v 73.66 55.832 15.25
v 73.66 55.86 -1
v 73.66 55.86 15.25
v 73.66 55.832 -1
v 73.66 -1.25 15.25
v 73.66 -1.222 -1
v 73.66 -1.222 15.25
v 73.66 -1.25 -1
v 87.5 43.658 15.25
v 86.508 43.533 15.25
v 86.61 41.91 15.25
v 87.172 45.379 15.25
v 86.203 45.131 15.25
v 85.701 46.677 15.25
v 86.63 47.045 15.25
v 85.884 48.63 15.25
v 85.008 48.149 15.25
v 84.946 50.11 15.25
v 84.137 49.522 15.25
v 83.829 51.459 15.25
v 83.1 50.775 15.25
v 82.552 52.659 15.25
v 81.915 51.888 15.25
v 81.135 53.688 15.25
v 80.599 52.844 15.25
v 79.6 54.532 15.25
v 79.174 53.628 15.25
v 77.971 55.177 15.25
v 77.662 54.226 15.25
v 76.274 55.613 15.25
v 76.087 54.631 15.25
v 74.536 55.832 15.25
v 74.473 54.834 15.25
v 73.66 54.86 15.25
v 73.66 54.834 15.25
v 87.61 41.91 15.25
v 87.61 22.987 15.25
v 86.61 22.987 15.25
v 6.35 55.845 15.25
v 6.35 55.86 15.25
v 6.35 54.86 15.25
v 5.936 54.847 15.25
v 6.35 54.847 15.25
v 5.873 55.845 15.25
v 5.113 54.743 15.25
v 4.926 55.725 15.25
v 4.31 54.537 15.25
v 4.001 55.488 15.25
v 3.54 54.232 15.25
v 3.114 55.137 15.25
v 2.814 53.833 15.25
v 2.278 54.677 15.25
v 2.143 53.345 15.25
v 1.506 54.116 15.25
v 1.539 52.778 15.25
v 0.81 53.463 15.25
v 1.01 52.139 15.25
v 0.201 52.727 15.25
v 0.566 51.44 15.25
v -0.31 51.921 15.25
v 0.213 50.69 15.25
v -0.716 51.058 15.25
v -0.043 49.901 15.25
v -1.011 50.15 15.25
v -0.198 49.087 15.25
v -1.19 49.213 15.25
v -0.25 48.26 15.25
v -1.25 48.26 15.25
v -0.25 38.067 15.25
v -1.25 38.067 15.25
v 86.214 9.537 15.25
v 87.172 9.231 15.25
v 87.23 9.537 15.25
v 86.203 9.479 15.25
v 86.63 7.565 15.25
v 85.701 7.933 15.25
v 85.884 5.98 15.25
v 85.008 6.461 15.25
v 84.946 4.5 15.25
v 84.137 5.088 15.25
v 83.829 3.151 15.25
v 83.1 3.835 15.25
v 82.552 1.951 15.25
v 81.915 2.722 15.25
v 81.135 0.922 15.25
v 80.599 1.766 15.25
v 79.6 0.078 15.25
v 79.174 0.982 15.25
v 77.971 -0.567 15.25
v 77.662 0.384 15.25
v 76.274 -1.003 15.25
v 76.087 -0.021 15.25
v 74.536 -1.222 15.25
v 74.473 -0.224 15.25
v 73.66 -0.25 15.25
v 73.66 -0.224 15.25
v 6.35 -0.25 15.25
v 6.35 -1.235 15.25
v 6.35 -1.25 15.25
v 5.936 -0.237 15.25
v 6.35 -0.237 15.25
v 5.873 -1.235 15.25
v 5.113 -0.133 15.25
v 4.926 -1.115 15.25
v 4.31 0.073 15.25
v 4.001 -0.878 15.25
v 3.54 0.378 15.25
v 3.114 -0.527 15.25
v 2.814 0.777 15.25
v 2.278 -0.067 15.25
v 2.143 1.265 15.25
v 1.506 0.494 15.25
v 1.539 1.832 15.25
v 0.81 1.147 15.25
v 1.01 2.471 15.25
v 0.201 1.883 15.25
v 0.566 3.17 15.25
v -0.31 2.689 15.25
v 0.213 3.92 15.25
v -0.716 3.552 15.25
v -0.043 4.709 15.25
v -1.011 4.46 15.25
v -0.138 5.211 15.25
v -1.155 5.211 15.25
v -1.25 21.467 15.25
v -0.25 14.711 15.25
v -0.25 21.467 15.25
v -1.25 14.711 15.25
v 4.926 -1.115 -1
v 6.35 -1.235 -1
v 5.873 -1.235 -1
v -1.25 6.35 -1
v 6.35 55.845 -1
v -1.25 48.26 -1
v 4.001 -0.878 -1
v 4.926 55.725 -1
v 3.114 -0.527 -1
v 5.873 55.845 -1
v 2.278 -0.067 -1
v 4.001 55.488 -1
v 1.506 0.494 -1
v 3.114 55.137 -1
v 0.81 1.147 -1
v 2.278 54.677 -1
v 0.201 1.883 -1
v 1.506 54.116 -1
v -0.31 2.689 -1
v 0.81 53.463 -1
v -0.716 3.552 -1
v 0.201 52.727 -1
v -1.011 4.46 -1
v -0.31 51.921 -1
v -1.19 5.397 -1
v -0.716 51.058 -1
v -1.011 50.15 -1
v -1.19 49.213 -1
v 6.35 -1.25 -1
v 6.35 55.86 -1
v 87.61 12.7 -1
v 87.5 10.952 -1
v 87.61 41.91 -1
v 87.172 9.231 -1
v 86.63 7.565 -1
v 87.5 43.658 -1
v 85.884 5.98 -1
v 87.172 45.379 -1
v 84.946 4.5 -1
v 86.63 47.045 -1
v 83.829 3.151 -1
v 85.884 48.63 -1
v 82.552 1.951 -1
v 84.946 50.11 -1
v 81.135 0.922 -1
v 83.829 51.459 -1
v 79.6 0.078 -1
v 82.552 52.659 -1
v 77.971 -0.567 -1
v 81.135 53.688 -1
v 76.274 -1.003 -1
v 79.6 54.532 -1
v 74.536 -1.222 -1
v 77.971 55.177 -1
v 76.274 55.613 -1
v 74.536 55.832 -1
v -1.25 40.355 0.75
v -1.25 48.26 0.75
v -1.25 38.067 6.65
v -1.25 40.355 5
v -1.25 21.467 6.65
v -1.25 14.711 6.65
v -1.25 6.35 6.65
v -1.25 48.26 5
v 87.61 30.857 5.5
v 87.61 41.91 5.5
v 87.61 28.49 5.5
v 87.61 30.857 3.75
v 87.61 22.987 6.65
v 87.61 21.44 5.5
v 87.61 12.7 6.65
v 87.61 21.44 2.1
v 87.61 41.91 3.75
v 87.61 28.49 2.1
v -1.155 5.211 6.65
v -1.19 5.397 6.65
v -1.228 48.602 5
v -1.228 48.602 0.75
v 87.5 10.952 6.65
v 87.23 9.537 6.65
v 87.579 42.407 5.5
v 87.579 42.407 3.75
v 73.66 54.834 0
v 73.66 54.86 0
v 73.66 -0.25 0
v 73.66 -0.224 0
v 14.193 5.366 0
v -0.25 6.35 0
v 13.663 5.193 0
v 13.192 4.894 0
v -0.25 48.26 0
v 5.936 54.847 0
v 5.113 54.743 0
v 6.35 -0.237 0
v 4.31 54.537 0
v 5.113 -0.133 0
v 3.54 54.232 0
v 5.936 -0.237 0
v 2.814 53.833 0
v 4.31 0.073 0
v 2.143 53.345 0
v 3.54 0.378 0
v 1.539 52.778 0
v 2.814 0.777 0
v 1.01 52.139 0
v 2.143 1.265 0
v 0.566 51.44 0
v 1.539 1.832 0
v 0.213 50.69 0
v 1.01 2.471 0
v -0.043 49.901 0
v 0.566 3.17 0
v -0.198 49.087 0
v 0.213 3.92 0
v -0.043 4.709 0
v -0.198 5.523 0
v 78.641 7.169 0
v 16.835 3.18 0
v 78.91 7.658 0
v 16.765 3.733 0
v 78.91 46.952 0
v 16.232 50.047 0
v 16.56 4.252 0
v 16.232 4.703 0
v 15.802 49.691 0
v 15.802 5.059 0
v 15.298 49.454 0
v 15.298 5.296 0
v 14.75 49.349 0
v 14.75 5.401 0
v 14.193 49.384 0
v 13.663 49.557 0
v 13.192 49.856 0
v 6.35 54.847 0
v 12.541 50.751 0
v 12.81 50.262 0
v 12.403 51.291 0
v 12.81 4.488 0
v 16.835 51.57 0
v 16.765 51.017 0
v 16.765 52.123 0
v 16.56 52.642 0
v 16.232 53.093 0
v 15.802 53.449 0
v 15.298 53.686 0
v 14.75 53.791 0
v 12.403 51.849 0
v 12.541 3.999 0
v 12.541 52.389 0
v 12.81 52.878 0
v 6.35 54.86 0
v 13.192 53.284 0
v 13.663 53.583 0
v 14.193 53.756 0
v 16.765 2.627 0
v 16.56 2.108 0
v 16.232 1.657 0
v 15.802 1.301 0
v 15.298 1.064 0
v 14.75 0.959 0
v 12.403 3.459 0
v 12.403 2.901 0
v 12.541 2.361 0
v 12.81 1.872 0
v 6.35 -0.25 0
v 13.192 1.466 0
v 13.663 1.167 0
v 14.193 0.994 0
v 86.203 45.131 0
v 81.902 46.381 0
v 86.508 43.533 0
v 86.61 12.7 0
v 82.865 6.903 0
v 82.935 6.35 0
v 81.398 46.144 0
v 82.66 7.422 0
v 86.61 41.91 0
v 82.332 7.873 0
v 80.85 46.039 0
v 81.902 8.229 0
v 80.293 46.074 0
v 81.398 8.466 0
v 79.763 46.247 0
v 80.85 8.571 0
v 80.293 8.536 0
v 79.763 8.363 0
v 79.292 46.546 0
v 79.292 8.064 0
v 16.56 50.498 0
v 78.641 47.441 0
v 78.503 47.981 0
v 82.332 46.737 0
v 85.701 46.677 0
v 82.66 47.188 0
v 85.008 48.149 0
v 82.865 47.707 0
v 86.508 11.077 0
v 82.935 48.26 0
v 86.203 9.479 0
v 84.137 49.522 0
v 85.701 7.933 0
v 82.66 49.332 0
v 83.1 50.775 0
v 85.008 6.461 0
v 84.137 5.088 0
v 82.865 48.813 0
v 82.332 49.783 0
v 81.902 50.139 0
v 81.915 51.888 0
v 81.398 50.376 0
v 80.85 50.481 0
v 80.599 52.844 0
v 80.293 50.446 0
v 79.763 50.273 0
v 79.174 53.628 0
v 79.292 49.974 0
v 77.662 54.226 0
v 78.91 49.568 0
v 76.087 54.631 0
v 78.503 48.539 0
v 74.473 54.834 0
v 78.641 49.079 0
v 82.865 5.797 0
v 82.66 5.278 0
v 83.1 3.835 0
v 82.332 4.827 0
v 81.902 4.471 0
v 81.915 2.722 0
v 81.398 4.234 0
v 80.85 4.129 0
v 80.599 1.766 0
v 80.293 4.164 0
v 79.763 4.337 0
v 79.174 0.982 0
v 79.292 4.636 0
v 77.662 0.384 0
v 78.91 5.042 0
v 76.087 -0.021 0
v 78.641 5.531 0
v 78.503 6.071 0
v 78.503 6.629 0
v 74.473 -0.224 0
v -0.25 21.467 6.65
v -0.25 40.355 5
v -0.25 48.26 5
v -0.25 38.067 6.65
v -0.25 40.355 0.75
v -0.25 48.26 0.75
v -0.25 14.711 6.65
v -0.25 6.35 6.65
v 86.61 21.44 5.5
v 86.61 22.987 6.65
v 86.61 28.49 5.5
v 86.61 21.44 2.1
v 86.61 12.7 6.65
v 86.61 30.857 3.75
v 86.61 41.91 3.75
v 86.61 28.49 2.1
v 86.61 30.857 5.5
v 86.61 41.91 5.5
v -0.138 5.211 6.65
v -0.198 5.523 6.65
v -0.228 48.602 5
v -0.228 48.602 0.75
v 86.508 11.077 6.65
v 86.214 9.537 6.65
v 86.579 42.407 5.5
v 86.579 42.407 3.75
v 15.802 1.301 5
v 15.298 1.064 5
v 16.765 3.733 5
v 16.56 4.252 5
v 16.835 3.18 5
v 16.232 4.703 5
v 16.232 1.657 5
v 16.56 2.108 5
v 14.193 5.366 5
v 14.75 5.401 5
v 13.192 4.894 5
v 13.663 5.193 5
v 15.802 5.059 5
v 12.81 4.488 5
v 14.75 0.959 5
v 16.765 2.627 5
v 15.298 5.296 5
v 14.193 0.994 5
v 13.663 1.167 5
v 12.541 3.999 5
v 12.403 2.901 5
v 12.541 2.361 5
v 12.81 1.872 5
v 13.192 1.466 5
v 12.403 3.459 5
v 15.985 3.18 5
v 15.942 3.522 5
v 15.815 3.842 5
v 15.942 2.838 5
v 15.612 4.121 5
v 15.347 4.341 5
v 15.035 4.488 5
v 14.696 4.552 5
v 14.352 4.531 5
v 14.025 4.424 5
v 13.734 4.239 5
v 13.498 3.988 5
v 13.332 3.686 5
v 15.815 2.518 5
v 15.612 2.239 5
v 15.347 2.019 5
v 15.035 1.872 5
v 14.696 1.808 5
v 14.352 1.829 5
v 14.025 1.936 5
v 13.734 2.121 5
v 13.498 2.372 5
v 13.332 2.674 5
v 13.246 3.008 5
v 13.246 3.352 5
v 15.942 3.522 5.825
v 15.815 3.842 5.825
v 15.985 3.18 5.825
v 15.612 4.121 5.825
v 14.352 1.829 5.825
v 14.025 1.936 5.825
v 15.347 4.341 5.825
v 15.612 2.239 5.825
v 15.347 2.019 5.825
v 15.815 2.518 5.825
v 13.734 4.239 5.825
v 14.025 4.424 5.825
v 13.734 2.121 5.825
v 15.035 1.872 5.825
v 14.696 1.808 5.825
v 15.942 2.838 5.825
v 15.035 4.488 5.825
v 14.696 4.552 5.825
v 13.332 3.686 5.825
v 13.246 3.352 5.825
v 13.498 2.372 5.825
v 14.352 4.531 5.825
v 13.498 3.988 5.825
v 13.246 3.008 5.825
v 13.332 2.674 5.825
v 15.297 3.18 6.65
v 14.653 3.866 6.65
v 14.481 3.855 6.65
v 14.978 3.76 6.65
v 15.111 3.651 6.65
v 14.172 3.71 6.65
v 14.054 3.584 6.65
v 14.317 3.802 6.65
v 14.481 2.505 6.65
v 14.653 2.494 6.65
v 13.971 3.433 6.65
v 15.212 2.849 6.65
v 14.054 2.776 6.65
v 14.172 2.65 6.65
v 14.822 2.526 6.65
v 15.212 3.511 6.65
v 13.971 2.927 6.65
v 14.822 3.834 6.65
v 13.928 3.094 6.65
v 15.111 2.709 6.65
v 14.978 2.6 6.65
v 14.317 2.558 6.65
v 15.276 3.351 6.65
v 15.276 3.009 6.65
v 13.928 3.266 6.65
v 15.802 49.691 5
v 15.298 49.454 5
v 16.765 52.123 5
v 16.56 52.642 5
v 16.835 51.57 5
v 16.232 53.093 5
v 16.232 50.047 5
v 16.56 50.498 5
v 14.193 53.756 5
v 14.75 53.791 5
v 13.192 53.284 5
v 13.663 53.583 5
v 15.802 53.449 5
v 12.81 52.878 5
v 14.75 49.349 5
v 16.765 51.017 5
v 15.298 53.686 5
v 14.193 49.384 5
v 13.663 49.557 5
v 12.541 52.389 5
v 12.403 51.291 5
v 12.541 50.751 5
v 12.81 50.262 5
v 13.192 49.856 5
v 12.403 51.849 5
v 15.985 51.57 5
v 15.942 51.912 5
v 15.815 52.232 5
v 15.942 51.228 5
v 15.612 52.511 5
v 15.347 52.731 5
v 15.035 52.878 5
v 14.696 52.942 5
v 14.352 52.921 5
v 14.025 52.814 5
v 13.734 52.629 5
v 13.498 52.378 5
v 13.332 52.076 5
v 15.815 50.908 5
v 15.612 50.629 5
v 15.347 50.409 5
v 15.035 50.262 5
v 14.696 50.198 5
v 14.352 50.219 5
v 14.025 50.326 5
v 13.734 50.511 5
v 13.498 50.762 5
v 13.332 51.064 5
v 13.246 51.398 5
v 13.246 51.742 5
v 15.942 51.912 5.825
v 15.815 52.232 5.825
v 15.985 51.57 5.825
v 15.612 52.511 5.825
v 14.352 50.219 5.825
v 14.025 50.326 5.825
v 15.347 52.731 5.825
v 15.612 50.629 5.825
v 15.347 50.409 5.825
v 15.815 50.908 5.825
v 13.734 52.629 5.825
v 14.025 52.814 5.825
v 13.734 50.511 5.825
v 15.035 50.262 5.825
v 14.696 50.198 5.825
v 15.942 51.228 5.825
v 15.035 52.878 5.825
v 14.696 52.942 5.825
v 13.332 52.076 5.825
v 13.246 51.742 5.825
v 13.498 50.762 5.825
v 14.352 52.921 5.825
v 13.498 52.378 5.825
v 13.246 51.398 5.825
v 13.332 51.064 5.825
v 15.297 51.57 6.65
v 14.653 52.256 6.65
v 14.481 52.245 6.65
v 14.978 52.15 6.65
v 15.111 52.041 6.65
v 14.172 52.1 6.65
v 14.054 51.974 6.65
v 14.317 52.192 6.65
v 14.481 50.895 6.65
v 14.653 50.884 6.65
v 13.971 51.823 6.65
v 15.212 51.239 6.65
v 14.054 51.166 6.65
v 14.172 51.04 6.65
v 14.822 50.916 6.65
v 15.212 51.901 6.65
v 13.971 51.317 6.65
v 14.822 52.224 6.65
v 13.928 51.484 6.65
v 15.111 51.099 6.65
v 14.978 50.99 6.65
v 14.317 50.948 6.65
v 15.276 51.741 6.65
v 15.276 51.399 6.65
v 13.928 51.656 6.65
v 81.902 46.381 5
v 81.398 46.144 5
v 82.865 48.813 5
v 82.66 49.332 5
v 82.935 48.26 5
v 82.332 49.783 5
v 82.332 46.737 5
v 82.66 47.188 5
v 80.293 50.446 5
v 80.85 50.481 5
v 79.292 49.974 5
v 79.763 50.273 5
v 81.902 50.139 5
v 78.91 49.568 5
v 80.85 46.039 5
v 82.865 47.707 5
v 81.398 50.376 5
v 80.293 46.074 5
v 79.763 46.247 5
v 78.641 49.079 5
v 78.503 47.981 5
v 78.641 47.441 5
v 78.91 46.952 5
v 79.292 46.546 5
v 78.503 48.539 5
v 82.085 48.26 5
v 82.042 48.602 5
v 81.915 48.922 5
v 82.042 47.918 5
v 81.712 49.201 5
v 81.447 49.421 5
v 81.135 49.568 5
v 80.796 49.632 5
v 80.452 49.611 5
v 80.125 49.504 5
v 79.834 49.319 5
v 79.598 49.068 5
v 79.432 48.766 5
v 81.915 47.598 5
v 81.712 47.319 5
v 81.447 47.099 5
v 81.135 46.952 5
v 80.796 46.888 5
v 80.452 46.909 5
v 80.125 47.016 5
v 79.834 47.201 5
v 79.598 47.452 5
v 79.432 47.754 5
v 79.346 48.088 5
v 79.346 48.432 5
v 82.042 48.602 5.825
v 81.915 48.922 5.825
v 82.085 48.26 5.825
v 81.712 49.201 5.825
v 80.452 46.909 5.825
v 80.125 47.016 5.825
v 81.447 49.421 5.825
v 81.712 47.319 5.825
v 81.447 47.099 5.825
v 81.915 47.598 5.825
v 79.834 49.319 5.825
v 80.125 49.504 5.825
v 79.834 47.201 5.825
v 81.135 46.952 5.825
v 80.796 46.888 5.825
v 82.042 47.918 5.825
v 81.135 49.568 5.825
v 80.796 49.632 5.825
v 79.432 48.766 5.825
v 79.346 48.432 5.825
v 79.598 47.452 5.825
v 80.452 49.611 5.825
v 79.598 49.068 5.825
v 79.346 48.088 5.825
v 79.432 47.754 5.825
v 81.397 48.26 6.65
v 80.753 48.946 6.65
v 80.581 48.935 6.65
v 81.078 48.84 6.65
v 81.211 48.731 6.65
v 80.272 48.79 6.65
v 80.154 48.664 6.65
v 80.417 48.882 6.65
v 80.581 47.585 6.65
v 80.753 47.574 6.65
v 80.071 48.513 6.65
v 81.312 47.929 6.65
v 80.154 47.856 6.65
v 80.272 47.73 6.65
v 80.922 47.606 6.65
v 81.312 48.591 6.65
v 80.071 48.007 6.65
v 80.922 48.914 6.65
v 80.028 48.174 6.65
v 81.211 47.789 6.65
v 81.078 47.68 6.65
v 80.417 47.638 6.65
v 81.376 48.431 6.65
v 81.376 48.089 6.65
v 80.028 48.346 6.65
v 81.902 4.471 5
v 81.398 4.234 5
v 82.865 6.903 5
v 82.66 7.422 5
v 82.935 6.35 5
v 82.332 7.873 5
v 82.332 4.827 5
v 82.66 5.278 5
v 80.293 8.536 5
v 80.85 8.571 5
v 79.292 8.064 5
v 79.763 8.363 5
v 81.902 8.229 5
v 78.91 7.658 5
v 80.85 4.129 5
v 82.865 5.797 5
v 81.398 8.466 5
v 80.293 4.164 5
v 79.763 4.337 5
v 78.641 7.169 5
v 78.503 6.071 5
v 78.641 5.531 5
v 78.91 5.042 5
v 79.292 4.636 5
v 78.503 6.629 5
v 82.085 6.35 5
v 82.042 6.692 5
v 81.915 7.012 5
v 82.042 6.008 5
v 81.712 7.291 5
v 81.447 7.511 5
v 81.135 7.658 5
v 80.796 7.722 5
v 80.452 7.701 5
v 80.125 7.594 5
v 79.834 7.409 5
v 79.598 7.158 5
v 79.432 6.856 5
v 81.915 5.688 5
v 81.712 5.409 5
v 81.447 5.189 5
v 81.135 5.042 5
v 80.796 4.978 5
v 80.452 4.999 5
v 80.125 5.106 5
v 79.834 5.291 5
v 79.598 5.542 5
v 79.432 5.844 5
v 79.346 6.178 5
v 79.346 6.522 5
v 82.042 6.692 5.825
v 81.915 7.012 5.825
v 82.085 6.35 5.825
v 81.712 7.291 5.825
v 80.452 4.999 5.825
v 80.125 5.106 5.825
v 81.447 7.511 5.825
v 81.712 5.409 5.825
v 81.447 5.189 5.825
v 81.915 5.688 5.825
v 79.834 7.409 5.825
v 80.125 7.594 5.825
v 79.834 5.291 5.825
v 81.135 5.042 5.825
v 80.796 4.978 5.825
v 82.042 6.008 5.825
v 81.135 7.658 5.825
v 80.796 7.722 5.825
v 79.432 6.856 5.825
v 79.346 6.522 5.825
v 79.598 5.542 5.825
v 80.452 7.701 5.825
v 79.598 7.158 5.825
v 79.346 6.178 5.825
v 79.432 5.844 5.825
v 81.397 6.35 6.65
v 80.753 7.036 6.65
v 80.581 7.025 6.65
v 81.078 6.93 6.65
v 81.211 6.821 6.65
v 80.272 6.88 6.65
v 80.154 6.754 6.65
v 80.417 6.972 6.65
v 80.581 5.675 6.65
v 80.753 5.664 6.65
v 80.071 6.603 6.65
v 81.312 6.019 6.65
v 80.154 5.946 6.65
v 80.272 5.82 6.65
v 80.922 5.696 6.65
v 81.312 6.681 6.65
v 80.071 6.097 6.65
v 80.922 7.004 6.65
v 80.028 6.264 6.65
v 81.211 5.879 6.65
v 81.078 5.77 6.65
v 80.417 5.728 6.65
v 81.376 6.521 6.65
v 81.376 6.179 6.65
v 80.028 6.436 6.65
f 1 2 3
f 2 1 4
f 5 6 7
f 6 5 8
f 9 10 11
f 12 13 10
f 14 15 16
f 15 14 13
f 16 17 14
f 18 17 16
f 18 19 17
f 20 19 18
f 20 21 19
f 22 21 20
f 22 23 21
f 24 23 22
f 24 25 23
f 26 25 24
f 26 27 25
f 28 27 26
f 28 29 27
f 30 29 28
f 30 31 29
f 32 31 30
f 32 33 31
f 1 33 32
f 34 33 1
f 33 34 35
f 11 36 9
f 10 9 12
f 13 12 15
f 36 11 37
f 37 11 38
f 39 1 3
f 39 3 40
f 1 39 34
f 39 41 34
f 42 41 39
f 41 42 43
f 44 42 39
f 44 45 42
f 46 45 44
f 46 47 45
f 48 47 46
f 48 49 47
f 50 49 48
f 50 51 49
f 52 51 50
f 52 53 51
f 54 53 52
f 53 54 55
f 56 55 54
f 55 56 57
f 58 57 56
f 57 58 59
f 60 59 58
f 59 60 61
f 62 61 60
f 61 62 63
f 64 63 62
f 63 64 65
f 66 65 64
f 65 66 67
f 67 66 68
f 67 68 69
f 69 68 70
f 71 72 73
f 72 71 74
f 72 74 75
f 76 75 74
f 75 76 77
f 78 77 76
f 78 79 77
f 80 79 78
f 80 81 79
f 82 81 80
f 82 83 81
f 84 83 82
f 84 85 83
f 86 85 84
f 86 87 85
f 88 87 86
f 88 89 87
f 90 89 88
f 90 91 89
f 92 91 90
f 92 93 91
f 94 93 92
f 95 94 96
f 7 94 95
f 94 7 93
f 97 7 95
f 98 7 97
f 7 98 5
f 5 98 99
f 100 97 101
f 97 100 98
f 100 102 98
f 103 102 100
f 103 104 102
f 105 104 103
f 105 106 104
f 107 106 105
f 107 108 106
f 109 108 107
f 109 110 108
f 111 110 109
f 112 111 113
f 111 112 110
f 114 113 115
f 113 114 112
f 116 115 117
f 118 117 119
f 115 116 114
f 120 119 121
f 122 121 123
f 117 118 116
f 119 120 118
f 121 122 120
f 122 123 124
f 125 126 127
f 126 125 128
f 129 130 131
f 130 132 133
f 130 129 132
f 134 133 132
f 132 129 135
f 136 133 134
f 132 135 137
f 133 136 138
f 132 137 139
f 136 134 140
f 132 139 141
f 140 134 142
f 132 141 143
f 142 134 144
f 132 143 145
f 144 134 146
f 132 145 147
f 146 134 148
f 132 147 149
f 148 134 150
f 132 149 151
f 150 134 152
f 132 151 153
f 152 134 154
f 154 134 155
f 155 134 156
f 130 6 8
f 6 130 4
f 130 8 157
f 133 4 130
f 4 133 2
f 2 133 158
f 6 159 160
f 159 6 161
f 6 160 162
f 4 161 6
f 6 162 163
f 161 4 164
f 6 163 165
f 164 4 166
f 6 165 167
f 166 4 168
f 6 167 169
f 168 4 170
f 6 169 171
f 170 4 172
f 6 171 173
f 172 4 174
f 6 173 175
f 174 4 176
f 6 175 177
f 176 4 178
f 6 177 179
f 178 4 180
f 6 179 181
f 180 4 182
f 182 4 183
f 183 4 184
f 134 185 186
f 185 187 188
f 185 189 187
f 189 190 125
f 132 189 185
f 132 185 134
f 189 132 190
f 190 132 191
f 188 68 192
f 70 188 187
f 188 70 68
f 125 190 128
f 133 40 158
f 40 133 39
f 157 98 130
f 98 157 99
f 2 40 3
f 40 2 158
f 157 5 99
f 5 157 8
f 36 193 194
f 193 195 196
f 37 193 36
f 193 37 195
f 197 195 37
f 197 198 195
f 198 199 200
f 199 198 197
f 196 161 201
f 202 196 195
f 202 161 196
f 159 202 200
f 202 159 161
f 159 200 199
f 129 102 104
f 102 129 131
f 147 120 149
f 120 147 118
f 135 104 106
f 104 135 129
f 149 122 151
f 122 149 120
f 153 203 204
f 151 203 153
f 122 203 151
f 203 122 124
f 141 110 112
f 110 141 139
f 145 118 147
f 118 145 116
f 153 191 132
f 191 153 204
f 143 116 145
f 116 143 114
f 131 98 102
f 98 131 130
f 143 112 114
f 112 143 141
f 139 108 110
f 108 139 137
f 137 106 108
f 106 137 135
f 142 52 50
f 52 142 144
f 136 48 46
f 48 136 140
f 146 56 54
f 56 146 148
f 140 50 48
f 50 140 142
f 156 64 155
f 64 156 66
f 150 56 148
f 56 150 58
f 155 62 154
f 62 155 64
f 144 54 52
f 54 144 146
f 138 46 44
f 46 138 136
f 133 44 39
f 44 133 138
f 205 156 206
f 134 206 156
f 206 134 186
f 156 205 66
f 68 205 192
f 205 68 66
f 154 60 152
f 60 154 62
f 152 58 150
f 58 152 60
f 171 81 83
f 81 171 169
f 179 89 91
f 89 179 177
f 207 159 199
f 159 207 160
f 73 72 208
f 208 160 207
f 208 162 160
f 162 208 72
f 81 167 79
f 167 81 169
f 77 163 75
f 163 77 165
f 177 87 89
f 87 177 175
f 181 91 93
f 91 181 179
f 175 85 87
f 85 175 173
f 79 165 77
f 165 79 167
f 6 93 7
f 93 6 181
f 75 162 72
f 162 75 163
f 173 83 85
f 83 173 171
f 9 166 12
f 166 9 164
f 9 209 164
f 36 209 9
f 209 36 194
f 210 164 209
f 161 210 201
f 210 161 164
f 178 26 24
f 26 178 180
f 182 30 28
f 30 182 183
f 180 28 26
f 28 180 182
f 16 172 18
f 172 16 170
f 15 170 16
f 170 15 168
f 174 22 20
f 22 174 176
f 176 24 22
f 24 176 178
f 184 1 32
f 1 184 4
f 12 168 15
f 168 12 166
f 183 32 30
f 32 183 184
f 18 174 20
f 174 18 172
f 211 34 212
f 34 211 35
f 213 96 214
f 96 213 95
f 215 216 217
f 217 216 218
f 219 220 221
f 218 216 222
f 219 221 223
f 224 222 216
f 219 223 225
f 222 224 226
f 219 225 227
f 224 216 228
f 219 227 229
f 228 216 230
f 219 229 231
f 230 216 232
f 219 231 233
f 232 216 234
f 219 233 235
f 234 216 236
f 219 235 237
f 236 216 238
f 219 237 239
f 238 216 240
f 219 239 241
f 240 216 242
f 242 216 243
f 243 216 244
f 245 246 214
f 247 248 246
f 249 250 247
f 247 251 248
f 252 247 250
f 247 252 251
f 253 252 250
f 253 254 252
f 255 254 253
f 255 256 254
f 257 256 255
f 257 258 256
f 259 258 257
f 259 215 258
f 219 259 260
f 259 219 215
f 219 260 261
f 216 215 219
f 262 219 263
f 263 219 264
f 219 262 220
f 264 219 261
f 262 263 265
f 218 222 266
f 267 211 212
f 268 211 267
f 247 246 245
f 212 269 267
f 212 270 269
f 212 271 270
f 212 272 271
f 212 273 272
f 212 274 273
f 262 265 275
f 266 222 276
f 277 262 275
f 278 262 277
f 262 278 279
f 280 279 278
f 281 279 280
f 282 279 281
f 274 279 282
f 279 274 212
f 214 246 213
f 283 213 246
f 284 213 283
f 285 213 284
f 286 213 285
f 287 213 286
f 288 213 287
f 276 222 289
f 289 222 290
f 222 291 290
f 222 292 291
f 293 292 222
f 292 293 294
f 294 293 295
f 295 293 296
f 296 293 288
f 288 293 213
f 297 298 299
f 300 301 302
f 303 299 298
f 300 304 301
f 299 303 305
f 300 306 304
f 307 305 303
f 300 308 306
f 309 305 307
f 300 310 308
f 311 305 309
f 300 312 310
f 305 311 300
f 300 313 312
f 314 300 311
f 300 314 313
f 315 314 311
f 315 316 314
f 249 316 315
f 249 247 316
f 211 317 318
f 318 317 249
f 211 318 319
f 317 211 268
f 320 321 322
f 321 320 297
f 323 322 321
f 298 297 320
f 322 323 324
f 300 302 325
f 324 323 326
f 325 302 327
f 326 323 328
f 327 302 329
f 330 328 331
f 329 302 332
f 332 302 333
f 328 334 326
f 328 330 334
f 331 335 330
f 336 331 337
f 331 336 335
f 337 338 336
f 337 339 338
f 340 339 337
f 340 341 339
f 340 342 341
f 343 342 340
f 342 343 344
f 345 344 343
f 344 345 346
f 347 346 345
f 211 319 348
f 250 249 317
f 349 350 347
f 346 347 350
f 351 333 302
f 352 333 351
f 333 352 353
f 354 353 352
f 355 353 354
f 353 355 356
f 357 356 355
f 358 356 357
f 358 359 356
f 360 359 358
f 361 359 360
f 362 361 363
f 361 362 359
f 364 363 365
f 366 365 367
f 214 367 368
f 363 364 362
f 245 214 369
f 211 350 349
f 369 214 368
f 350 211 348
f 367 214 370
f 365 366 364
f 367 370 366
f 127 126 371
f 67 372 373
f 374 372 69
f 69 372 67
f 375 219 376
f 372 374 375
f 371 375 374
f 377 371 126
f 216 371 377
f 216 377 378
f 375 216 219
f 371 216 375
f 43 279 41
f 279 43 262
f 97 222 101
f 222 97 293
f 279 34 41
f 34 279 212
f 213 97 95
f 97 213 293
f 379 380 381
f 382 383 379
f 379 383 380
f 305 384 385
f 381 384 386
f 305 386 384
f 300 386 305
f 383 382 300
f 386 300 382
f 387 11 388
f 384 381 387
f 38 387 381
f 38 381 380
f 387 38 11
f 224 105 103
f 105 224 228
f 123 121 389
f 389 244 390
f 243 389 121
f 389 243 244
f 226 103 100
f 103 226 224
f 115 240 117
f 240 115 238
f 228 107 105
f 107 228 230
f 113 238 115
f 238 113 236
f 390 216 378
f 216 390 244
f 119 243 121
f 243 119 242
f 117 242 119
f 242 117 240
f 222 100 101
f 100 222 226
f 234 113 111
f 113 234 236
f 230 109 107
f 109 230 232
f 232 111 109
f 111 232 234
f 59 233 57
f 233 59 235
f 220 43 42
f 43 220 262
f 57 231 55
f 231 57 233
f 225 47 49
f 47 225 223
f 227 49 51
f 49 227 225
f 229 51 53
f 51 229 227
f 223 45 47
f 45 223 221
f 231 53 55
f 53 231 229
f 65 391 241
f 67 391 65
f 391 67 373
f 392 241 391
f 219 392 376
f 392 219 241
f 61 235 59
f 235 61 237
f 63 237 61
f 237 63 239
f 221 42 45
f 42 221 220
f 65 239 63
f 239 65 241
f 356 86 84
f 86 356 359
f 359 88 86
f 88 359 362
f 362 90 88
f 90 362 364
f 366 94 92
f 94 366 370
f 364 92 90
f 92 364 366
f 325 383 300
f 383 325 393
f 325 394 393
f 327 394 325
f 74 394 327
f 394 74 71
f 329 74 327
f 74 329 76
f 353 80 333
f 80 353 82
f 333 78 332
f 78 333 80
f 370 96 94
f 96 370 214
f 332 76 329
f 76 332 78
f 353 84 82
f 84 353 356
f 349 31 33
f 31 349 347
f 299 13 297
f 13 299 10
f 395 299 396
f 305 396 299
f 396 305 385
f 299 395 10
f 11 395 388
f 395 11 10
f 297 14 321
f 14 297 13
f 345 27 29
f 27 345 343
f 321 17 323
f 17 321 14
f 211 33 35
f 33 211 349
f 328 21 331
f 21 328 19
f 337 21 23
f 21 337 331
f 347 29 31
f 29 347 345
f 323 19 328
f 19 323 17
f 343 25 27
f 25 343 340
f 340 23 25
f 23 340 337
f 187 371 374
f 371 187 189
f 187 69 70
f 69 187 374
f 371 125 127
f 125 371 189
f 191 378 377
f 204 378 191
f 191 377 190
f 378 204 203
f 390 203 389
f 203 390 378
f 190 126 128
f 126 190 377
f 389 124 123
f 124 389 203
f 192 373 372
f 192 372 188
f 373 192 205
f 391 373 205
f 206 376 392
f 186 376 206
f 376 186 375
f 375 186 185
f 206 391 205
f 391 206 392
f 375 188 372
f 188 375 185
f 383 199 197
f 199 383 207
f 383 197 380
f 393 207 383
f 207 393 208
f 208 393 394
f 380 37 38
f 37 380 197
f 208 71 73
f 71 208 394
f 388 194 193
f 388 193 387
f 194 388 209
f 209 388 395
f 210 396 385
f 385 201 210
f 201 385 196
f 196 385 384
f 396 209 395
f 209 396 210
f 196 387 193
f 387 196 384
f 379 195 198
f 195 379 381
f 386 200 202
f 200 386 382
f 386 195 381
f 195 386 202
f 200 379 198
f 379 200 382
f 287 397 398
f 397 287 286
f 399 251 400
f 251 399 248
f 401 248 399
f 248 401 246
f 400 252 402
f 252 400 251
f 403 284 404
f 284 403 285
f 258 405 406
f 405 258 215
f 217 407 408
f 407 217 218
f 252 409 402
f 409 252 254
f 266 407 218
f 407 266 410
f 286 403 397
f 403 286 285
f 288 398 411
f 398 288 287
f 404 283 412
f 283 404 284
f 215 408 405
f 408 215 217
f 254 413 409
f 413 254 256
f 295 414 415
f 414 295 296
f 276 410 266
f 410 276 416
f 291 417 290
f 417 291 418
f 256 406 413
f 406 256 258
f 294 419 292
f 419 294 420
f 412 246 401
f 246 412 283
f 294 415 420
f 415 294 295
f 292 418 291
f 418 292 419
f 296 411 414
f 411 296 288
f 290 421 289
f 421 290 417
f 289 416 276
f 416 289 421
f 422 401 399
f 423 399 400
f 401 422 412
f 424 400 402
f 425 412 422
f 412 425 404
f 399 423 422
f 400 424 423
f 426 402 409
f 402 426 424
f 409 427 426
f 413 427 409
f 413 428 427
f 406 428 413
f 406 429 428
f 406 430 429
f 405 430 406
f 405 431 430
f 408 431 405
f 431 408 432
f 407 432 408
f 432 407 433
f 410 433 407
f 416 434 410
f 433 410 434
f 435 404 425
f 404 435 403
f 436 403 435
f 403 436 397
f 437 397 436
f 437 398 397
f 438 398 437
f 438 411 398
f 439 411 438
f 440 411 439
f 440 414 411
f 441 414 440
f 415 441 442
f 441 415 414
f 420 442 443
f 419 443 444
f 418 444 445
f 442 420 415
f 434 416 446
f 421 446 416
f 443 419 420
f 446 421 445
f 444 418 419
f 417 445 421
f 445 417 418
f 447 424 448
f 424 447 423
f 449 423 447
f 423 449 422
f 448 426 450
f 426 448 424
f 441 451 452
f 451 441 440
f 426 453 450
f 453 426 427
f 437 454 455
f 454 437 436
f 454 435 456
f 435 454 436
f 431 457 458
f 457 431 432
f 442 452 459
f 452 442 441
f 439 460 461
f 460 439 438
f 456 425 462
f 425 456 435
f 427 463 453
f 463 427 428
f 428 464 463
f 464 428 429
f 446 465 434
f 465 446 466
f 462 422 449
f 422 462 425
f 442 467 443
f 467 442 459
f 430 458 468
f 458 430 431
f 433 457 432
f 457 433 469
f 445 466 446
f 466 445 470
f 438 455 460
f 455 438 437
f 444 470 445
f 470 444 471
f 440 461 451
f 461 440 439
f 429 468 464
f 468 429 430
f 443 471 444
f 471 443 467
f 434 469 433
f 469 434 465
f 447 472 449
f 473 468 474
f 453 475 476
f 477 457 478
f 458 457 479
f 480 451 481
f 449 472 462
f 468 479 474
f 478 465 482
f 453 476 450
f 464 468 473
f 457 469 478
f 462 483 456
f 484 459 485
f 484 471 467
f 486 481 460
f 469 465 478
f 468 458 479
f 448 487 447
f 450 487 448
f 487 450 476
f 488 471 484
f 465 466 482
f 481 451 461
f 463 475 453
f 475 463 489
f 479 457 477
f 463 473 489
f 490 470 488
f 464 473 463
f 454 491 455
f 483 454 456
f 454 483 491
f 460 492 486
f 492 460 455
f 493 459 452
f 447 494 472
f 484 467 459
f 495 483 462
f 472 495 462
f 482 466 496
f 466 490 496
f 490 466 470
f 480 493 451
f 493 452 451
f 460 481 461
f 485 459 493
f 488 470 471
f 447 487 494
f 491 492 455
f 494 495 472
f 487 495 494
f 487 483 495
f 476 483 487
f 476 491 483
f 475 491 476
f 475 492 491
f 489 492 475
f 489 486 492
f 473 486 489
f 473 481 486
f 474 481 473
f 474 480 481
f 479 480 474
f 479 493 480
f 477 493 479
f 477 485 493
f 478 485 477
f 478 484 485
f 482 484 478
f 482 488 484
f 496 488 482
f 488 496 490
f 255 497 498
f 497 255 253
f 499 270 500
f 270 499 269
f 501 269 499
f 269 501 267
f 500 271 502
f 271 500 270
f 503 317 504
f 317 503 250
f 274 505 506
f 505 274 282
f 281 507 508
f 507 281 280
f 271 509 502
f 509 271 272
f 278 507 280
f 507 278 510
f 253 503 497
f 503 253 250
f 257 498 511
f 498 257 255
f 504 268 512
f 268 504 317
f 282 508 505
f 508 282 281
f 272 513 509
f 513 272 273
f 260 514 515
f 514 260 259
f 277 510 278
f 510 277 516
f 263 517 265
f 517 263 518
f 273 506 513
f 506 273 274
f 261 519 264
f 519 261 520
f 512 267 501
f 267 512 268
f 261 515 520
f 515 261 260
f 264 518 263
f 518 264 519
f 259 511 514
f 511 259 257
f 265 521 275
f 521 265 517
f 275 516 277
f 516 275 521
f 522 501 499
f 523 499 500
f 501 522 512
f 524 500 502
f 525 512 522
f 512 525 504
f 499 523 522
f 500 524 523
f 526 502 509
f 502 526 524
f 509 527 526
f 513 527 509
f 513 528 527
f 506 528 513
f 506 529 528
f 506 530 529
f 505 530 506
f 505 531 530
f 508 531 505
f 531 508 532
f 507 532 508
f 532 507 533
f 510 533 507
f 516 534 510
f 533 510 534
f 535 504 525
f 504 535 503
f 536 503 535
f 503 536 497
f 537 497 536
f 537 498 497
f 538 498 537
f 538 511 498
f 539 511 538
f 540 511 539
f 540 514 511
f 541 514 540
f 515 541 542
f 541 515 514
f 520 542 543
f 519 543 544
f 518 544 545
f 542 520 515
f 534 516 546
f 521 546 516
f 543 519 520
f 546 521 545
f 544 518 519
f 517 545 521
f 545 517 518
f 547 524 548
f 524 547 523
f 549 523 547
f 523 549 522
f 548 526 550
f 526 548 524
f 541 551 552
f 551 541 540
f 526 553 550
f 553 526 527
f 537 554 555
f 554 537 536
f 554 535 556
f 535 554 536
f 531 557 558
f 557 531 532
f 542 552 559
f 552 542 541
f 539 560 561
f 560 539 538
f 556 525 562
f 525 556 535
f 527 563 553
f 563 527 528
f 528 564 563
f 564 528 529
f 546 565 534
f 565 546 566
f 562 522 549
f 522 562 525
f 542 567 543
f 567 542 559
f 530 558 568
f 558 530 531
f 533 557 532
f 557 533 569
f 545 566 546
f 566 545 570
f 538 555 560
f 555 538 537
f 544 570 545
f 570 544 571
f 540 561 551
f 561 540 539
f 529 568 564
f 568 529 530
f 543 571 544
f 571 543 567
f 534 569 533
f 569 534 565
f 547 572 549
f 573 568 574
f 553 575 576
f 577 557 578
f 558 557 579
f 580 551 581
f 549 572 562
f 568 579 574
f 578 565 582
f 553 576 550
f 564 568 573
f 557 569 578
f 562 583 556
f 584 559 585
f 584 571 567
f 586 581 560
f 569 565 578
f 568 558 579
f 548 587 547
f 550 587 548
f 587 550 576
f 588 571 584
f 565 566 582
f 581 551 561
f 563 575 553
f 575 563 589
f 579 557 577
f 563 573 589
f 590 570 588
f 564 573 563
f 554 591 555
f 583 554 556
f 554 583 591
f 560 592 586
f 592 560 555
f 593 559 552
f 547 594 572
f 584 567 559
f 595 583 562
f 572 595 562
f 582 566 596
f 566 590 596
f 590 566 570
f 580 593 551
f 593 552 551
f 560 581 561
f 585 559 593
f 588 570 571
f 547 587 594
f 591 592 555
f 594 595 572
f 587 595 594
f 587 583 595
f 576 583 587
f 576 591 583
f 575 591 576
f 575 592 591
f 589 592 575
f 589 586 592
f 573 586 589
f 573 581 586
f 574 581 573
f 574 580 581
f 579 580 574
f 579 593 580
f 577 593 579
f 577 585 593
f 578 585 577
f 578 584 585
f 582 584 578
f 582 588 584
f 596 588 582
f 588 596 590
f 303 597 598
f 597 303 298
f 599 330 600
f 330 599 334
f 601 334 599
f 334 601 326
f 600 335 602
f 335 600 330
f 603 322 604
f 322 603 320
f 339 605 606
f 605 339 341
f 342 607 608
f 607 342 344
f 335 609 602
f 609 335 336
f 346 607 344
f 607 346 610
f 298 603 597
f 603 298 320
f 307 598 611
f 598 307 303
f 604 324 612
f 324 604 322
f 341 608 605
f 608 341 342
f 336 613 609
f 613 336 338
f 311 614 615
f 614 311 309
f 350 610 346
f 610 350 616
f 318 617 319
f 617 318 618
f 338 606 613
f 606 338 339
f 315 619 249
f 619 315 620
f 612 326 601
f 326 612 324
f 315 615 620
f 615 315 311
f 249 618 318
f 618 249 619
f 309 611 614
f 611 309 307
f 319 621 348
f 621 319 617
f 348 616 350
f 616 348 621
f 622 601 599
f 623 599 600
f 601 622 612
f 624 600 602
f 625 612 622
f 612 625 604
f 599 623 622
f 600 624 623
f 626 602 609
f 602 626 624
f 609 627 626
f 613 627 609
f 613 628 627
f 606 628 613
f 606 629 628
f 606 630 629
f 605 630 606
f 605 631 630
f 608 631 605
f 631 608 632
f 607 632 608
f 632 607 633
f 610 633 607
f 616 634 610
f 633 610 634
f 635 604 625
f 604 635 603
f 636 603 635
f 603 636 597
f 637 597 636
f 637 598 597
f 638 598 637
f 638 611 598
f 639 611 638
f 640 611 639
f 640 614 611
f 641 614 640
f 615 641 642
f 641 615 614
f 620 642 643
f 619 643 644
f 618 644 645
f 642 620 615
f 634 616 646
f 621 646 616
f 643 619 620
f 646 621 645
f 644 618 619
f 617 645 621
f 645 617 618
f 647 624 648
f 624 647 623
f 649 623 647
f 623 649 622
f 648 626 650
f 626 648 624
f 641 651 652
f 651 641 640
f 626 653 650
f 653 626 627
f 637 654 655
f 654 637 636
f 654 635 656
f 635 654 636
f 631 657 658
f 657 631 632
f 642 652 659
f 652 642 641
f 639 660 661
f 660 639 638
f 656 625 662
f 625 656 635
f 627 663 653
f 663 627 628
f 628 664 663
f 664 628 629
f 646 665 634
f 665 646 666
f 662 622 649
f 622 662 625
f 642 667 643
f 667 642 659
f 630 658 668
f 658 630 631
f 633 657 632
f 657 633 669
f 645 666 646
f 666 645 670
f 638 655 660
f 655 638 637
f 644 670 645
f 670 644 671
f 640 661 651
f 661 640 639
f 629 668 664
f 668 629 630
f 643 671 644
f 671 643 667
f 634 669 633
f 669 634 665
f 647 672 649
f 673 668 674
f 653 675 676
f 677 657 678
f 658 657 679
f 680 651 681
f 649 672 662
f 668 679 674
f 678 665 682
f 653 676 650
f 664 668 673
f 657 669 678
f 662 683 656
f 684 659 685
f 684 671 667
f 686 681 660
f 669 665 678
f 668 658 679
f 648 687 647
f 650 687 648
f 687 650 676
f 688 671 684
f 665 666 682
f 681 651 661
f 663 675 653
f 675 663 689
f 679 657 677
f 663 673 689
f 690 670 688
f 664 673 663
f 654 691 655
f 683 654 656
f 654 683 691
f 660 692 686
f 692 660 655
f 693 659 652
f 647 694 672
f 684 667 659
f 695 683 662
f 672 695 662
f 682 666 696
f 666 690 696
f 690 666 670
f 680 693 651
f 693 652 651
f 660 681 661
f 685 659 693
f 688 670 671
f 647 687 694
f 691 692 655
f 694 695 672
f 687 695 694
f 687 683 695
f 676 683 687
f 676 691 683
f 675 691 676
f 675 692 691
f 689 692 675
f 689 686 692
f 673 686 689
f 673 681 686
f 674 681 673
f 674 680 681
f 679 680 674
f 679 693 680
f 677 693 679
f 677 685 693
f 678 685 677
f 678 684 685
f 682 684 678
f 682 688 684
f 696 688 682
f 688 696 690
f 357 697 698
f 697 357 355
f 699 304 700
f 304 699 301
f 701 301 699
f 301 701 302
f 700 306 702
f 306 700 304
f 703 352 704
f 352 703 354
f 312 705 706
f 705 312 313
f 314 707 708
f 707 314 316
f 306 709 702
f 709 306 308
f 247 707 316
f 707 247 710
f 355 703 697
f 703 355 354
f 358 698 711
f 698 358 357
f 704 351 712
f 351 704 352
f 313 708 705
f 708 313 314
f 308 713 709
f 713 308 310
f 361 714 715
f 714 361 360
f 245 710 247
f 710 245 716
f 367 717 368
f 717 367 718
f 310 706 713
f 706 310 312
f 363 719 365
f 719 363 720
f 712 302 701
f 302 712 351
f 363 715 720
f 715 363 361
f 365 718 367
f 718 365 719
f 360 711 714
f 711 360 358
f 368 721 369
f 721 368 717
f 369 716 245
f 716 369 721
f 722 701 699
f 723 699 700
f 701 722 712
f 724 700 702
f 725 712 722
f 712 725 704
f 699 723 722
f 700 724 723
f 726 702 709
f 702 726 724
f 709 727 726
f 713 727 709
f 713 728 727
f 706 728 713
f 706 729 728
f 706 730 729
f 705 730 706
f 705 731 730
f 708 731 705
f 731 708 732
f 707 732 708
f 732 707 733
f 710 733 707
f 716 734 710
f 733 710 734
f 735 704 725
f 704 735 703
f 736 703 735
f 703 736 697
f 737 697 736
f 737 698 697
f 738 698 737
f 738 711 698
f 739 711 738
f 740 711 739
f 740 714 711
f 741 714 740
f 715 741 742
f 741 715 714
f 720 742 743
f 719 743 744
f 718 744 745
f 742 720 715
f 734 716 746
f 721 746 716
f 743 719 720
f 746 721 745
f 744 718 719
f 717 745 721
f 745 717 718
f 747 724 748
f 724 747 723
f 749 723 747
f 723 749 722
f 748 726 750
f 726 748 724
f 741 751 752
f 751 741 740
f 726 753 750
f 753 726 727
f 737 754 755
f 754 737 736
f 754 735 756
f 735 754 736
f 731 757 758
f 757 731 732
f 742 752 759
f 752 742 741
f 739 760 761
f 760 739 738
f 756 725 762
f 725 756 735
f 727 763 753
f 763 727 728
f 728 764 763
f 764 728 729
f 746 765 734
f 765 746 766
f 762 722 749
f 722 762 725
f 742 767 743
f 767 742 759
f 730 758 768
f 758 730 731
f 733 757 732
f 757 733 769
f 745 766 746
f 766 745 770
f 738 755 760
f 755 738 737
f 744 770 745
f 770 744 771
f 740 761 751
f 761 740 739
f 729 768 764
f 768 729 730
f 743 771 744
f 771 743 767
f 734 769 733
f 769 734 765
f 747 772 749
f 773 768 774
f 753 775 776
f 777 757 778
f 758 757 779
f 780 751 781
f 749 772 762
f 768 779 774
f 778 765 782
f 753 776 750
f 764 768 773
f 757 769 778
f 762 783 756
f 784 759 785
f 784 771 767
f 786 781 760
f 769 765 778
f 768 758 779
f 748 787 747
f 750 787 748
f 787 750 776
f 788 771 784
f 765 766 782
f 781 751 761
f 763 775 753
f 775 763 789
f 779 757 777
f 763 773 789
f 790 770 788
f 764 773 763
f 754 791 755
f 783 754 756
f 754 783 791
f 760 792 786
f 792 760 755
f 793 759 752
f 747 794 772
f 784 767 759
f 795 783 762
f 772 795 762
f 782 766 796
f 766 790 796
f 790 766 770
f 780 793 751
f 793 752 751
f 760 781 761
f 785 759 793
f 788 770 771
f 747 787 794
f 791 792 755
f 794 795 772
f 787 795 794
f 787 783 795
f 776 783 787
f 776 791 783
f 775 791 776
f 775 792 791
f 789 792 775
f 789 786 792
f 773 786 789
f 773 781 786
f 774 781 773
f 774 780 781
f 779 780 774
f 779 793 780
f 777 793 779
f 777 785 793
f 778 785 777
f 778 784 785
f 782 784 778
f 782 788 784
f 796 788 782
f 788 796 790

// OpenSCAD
// ******************************************
// Beaglebone Black Slim Case
// By Isaac Hayes
// Copyright 2014
// http://scuttlebots.com
//
// This program is free software; you can redistribute it and/or modify
// it under the terms of the GNU General Public License as published by
// the Free Software Foundation; either version 2 of the License, or
// (at your option) any later version.
//
// This program is distributed in the hope that it will be useful,
// but WITHOUT ANY WARRANTY; without even the implied warranty of
// MERCHANTABILITY or FITNESS FOR A PARTICULAR PURPOSE.  See the
// GNU General Public License for more details.
//
// You should have received a copy of the GNU General Public License along
// with this program; if not, write to the Free Software Foundation, Inc.,
// 51 Franklin Street, Fifth Floor, Boston, MA 02110-1301 USA.
// ******************************************

// ************************************
// Render Options
// ************************************


// RENDER OPTIONS
// Set this variable to output the piece you want
// 0 - Visual Only render
// 1 - Base Only
// 2 - Lid

   Render_Options = 1;

// LID OPTIONS
// Set this to select various lid Options
// 0 = Solid
// 1 = Pin Header Cut Outs

   Lid_Options = 1;

// ************************************
// Dimensions and Locations Math(s)
// ************************************

// -All dimensions in millimeters
// -Origin at bottom left corner of PCB
// -Ethernet and power jack face left closest to origin
// -X and Y refer to position of lower left corner of compoenent from origin
// -Z refers to distance from top of component to the PCB
// -L and W are Lenght(X) and Width(Y) to specify component size

//Board Dimensions
BB_L = 86.36;
BB_W = 54.61;
BB_Z = 1.65;
BB_SmCurve_R = 6.35;
BB_LgCurve_R = 12.70;

//Mounting Hole Locations (Clockwise from Bottom)
BB_Hole1X = 14.61;
BB_Hole1Y = 3.18;

BB_Hole2X = 14.61;
BB_Hole2Y = BB_Hole1Y + 48.39;

BB_Hole3X = BB_Hole1X + 66.10;
BB_Hole3Y = 6.35 + 41.91;

BB_Hole4X = BB_Hole1X + 66.10;
BB_Hole4Y = 6.35;

BB_Hole_ID = 2.75;
BB_Hole_OD = 4.45;

//Pin Headers
BB_P9_X = 18.415;
BB_P9_Y = 0.635;
BB_P9_Z = 8.60;
BB_P9_L = 58.42;
BB_P9_W = 5.08;

BB_P8_X = 18.415;
BB_P8_Y = 48.895;
BB_P8_Z = 8.60;
BB_P8_L = 58.42;
BB_P8_W = 5.08;

//Capacitor
BB_Cap_X = 65.00;
BB_Cap_Y = 8.00;
BB_Cap_Z = 11.00;
BB_Cap_L = 6.00;
BB_Cap_W = 6.00;

//Power jack
BB_PJack_X = -2.54;
BB_PJack_Y = 5.461;
BB_PJack_Z = 10.75;
BB_PJack_L = 14.15;
BB_PJack_W = 9.00;

//Ethernet jack
BB_Eth_X = -2.54;
BB_Eth_Y = 21.717;
BB_Eth_Z = 13.33;
BB_Eth_L = 21.00;
BB_Eth_W = 16.10;

//Usb Host Port
BB_USBH_X = BB_L - 14.05;
BB_USBH_Y = 10.287 - 0.5;
BB_USBH_Z = 6.95;
BB_USBH_L = 14.05;
BB_USBH_W = 14.45 - 1.50;

//USB Mini Device Port
BB_USBD_X = -0.635;
BB_USBD_Y = 40.005 + 0.60;
BB_USBD_Z = 4.00;
BB_USBD_L = 6.91;
BB_USBD_W = 7.747;

//Micro HDMI port
BB_HDMI_X = BB_L + 0.635 - 7.50;
BB_HDMI_Y = 21.59 + 0.1;
BB_HDMI_Z = 2.90;
BB_HDMI_L = 7.50;
BB_HDMI_W = 6.55;

//MicroSD Card Port (Slot only)
BB_SD_X = BB_L - 14.90;
BB_SD_Y = 30.607 + 0.5;
BB_SD_Z = 1.75 - 0.5;
BB_SD_L = 14.90;
BB_SD_W = 11.05;

//Case Dimensions
Case_Thickness = 1.00;		//Wall Thickness
Case_Gap = 0.25;	//Gap between case walls and board
Case_L = BB_L + Case_Thickness*2 + Case_Gap*2;
Case_W = BB_W + Case_Thickness*2 + Case_Gap*2;
Case_SmCurve_R = BB_SmCurve_R + Case_Thickness + Case_Gap;
Case_LgCurve_R = BB_LgCurve_R + Case_Thickness + Case_Gap;
Case_PCB_Z = BB_USBD_Z + 1.00;		//Height PCB is suspended above case floor
Case_Z = Case_Thickness + Case_PCB_Z + BB_Z + BB_P9_Z;		//Total height of case
Cmp_Gap = 0.25;		//Gap around components
Cmp_Gap2 = Cmp_Gap*2;	//Gap around components times two

CutOut_L = BB_L + Case_Gap*2;
CutOut_W = BB_W + Case_Gap*2;
CutOut_SmCurve_R = BB_SmCurve_R + Case_Gap;
CutOut_LgCurve_R = BB_LgCurve_R + Case_Gap;
CutOut_Z = Case_Z - Case_Thickness;

Lid_Thickness = 1.50;
Lid_Grip_Thickness = 1.00;
Lid_Grip_Z = 2.00;
Lid_Grip_SmR = Case_SmCurve_R - Case_Thickness;
Lid_Grip_LgR = Case_LgCurve_R - Case_Thickness;

// ************************************
// Components
// ************************************

module Base()
{
	union() {
	difference() {
		//Outer Shell of Case
		translate([-Case_Thickness-Case_Gap, -Case_Thickness-Case_Gap, -Case_Thickness]) {
		union() {
			translate([0,Case_SmCurve_R,0]) cube([Case_L-Case_LgCurve_R, Case_W-Case_SmCurve_R*2, Case_Z]);
			translate([Case_SmCurve_R,0,0]) cube([Case_L-Case_SmCurve_R-Case_LgCurve_R, Case_W, Case_Z]);
			translate([Case_L-Case_LgCurve_R,Case_LgCurve_R,0]) cube([Case_LgCurve_R, Case_W-Case_LgCurve_R*2, Case_Z]);
			translate([Case_SmCurve_R,Case_SmCurve_R,0]) cylinder(h=Case_Z,r=Case_SmCurve_R,$fn=50);
			translate([Case_SmCurve_R,Case_W-Case_SmCurve_R,0]) cylinder(h=Case_Z,r=Case_SmCurve_R,$fn=50);
			translate([Case_L-Case_LgCurve_R,Case_LgCurve_R,0]) cylinder(h=Case_Z,r=Case_LgCurve_R,$fn=50);
			translate([Case_L-Case_LgCurve_R,Case_W-Case_LgCurve_R,0]) cylinder(h=Case_Z,r=Case_LgCurve_R,$fn=50);
		}}
		
		//Hollow Inside of Case
		translate([-Case_Gap,-Case_Gap,0]) {
		union() {
			translate([0,CutOut_SmCurve_R,0]) cube([CutOut_L-CutOut_LgCurve_R, CutOut_W-CutOut_SmCurve_R*2, CutOut_Z]);
			translate([CutOut_SmCurve_R,0,0]) cube([CutOut_L-CutOut_SmCurve_R-CutOut_LgCurve_R, CutOut_W, CutOut_Z]);
			translate([CutOut_L-CutOut_LgCurve_R,CutOut_LgCurve_R,0]) cube([CutOut_LgCurve_R, CutOut_W-CutOut_LgCurve_R*2, CutOut_Z]);
			translate([CutOut_SmCurve_R,CutOut_SmCurve_R,0]) cylinder(h=CutOut_Z,r=CutOut_SmCurve_R,$fn=50);
			translate([CutOut_SmCurve_R,CutOut_W-CutOut_SmCurve_R,0]) cylinder(h=CutOut_Z,r=CutOut_SmCurve_R,$fn=50);
			translate([CutOut_L-CutOut_LgCurve_R,CutOut_LgCurve_R,0]) cylinder(h=CutOut_Z,r=CutOut_LgCurve_R,$fn=50);
			translate([CutOut_L-CutOut_LgCurve_R,CutOut_W-CutOut_LgCurve_R,0]) cylinder(h=CutOut_Z,r=CutOut_LgCurve_R,$fn=50);
		}}
		
		//Components Cutouts

		//Ethernet Jack
		translate([BB_Eth_X-Cmp_Gap-1.25, BB_Eth_Y-Cmp_Gap, Case_PCB_Z+BB_Z]) cube([BB_Eth_L+Cmp_Gap2+1.25, BB_Eth_W+Cmp_Gap2, BB_Eth_Z+Cmp_Gap]);
		//Power Jack
		translate([BB_PJack_X-Cmp_Gap-1.25, BB_PJack_Y-Cmp_Gap, Case_PCB_Z+BB_Z]) cube([BB_PJack_L+Cmp_Gap2+1.25, BB_PJack_W+Cmp_Gap2, BB_PJack_Z+Cmp_Gap]);
		//USB Device Port
		translate([BB_USBD_X-Cmp_Gap-1.25, BB_USBD_Y-Cmp_Gap, 0.75]) cube([BB_USBD_L+Cmp_Gap2+1.25, BB_USBD_W+Cmp_Gap2, BB_USBD_Z+Cmp_Gap]);
		//USB Host
		translate([BB_USBH_X-Cmp_Gap, BB_USBH_Y-Cmp_Gap, Case_PCB_Z+BB_Z]) cube([BB_USBH_L+Cmp_Gap2+1.25, BB_USBH_W+Cmp_Gap2, CutOut_Z]);//BB_USBH_Z+Cmp_Gap]);
		//SD Card
		translate([BB_SD_X-Cmp_Gap, BB_SD_Y-Cmp_Gap, Case_PCB_Z-BB_SD_Z]) cube([BB_SD_L+Cmp_Gap2+1.25, BB_SD_W+Cmp_Gap2, BB_SD_Z+Cmp_Gap2]);
		//HDMI
		translate([BB_HDMI_X-Cmp_Gap, BB_HDMI_Y-Cmp_Gap, Case_PCB_Z-BB_HDMI_Z]) cube([BB_HDMI_L+Cmp_Gap2+1.25, BB_HDMI_W+Cmp_Gap2, BB_HDMI_Z+Cmp_Gap2]);
	}
		//Mounting pegs
		translate([BB_Hole1X,BB_Hole1Y,0]) MountingPeg();
		translate([BB_Hole2X,BB_Hole2Y,0]) MountingPeg();
		translate([BB_Hole3X,BB_Hole3Y,0]) MountingPeg();
		translate([BB_Hole4X,BB_Hole4Y,0]) MountingPeg();

	}
}

module Lid()
{
	difference() {	
		translate([-Case_Thickness-Case_Gap, -Case_Thickness-Case_Gap, -Case_Thickness]) {
		union() {
			translate([0,Case_SmCurve_R,Case_Z]) cube([Case_L-Case_LgCurve_R, Case_W-Case_SmCurve_R*2, Lid_Thickness]);
			translate([Case_SmCurve_R,0,Case_Z]) cube([Case_L-Case_SmCurve_R-Case_LgCurve_R, Case_W, Lid_Thickness]);
			translate([Case_L-Case_LgCurve_R,Case_LgCurve_R,Case_Z]) cube([Case_LgCurve_R, Case_W-Case_LgCurve_R*2, Lid_Thickness]);
			translate([Case_SmCurve_R,Case_SmCurve_R,Case_Z]) cylinder(h=Lid_Thickness,r=Case_SmCurve_R,$fn=50);
			translate([Case_SmCurve_R,Case_W-Case_SmCurve_R,Case_Z]) cylinder(h=Lid_Thickness,r=Case_SmCurve_R,$fn=50);
			translate([Case_L-Case_LgCurve_R,Case_LgCurve_R,Case_Z]) cylinder(h=Lid_Thickness,r=Case_LgCurve_R,$fn=50);
			translate([Case_L-Case_LgCurve_R,Case_W-Case_LgCurve_R,Case_Z]) cylinder(h=Lid_Thickness,r=Case_LgCurve_R,$fn=50);

			//Lid Grips
			translate([Case_Thickness,Case_Thickness,Case_Z-Lid_Grip_Z]) CornerGrip(Lid_Grip_SmR,Lid_Grip_Thickness,Lid_Grip_Z,0,0);
			translate([Case_L-Case_Thickness,Case_Thickness,Case_Z-Lid_Grip_Z]) CornerGrip(Lid_Grip_LgR,Lid_Grip_Thickness,Lid_Grip_Z,90,4);
			translate([Case_L-Case_Thickness,Case_W-Case_Thickness,Case_Z-Lid_Grip_Z]) CornerGrip(Lid_Grip_LgR,Lid_Grip_Thickness,Lid_Grip_Z,180,4);
			translate([Case_Thickness,Case_W-Case_Thickness,Case_Z-Lid_Grip_Z]) CornerGrip(Lid_Grip_SmR,Lid_Grip_Thickness,Lid_Grip_Z,270,0);
			translate([Case_Thickness,BB_PJack_Y+Case_Thickness+Case_Gap,Case_Z-Lid_Grip_Z]) cube([Lid_Grip_Thickness, BB_Eth_Y-BB_PJack_Y, Lid_Grip_Z]);
		}}

		//Component Cutouts
		
		//Ethernet Jack
		translate([BB_Eth_X-Cmp_Gap-1.25, BB_Eth_Y-Cmp_Gap, Case_PCB_Z+BB_Z]) cube([BB_Eth_L+Cmp_Gap2+1.25, BB_Eth_W+Cmp_Gap2, BB_Eth_Z+Cmp_Gap]);
		//Power Jack
		translate([BB_PJack_X-Cmp_Gap-1.25, BB_PJack_Y-Cmp_Gap, Case_PCB_Z+BB_Z]) cube([BB_PJack_L+Cmp_Gap2+1.25, BB_PJack_W+Cmp_Gap2, BB_PJack_Z+Cmp_Gap]);
		//Pin Headers
		if (Lid_Options == 1) {
			translate([BB_P8_X-Cmp_Gap, BB_P8_Y-Cmp_Gap, 0]) cube([BB_P8_L+Cmp_Gap2, BB_P8_W +Cmp_Gap2, 75]);
			translate([BB_P9_X-Cmp_Gap, BB_P9_Y-Cmp_Gap, 0]) cube([BB_P9_L+Cmp_Gap2, BB_P9_W +Cmp_Gap2, 75]);
		}
		//Capacitor
		translate([BB_Cap_X, BB_Cap_Y, Case_PCB_Z+BB_Z]) cube([BB_Cap_L, BB_Cap_W, BB_Cap_Z]);

		
	}
}

module MountingPeg()
{
	union() {
		cylinder(h=Case_PCB_Z, d=BB_Hole_OD, $fn=25);
		translate([0,0,Case_PCB_Z]) cylinder(h=BB_Z/2,d=BB_Hole_ID, $fn=25);
		translate([0,0,Case_PCB_Z+BB_Z/2]) cylinder(h=BB_Z/2,d1=BB_Hole_ID, d2=BB_Hole_ID/2, $fn=25);
	}
}

module CornerGrip(R,T,Z,D,CutOff)
{
	rotate([0,0,D]) {
		difference() {
			translate([R,R,0]) cylinder(r=R, h=Z, $fn=50);
			translate([R,R,0]) cylinder(r=R-T, h=Z, $fn=50);
			translate([R-CutOff,0,0]) cube([R*2+CutOff,R*2+CutOff,Z]);
			translate([0,R-CutOff,0]) cube([R*2+CutOff,R*2+CutOff,Z]);
		}
	}
}

// ************************************
// Output Renders
// ************************************

color("Green"){
	render(convexity=4) {
		if (Render_Options == 0) {
			Base();
			translate([0,0,3]) Lid();
		}
		if (Render_Options == 1) {
			Base();
		}
		if (Render_Options == 2) {
			Lid();
		}
	}
}
